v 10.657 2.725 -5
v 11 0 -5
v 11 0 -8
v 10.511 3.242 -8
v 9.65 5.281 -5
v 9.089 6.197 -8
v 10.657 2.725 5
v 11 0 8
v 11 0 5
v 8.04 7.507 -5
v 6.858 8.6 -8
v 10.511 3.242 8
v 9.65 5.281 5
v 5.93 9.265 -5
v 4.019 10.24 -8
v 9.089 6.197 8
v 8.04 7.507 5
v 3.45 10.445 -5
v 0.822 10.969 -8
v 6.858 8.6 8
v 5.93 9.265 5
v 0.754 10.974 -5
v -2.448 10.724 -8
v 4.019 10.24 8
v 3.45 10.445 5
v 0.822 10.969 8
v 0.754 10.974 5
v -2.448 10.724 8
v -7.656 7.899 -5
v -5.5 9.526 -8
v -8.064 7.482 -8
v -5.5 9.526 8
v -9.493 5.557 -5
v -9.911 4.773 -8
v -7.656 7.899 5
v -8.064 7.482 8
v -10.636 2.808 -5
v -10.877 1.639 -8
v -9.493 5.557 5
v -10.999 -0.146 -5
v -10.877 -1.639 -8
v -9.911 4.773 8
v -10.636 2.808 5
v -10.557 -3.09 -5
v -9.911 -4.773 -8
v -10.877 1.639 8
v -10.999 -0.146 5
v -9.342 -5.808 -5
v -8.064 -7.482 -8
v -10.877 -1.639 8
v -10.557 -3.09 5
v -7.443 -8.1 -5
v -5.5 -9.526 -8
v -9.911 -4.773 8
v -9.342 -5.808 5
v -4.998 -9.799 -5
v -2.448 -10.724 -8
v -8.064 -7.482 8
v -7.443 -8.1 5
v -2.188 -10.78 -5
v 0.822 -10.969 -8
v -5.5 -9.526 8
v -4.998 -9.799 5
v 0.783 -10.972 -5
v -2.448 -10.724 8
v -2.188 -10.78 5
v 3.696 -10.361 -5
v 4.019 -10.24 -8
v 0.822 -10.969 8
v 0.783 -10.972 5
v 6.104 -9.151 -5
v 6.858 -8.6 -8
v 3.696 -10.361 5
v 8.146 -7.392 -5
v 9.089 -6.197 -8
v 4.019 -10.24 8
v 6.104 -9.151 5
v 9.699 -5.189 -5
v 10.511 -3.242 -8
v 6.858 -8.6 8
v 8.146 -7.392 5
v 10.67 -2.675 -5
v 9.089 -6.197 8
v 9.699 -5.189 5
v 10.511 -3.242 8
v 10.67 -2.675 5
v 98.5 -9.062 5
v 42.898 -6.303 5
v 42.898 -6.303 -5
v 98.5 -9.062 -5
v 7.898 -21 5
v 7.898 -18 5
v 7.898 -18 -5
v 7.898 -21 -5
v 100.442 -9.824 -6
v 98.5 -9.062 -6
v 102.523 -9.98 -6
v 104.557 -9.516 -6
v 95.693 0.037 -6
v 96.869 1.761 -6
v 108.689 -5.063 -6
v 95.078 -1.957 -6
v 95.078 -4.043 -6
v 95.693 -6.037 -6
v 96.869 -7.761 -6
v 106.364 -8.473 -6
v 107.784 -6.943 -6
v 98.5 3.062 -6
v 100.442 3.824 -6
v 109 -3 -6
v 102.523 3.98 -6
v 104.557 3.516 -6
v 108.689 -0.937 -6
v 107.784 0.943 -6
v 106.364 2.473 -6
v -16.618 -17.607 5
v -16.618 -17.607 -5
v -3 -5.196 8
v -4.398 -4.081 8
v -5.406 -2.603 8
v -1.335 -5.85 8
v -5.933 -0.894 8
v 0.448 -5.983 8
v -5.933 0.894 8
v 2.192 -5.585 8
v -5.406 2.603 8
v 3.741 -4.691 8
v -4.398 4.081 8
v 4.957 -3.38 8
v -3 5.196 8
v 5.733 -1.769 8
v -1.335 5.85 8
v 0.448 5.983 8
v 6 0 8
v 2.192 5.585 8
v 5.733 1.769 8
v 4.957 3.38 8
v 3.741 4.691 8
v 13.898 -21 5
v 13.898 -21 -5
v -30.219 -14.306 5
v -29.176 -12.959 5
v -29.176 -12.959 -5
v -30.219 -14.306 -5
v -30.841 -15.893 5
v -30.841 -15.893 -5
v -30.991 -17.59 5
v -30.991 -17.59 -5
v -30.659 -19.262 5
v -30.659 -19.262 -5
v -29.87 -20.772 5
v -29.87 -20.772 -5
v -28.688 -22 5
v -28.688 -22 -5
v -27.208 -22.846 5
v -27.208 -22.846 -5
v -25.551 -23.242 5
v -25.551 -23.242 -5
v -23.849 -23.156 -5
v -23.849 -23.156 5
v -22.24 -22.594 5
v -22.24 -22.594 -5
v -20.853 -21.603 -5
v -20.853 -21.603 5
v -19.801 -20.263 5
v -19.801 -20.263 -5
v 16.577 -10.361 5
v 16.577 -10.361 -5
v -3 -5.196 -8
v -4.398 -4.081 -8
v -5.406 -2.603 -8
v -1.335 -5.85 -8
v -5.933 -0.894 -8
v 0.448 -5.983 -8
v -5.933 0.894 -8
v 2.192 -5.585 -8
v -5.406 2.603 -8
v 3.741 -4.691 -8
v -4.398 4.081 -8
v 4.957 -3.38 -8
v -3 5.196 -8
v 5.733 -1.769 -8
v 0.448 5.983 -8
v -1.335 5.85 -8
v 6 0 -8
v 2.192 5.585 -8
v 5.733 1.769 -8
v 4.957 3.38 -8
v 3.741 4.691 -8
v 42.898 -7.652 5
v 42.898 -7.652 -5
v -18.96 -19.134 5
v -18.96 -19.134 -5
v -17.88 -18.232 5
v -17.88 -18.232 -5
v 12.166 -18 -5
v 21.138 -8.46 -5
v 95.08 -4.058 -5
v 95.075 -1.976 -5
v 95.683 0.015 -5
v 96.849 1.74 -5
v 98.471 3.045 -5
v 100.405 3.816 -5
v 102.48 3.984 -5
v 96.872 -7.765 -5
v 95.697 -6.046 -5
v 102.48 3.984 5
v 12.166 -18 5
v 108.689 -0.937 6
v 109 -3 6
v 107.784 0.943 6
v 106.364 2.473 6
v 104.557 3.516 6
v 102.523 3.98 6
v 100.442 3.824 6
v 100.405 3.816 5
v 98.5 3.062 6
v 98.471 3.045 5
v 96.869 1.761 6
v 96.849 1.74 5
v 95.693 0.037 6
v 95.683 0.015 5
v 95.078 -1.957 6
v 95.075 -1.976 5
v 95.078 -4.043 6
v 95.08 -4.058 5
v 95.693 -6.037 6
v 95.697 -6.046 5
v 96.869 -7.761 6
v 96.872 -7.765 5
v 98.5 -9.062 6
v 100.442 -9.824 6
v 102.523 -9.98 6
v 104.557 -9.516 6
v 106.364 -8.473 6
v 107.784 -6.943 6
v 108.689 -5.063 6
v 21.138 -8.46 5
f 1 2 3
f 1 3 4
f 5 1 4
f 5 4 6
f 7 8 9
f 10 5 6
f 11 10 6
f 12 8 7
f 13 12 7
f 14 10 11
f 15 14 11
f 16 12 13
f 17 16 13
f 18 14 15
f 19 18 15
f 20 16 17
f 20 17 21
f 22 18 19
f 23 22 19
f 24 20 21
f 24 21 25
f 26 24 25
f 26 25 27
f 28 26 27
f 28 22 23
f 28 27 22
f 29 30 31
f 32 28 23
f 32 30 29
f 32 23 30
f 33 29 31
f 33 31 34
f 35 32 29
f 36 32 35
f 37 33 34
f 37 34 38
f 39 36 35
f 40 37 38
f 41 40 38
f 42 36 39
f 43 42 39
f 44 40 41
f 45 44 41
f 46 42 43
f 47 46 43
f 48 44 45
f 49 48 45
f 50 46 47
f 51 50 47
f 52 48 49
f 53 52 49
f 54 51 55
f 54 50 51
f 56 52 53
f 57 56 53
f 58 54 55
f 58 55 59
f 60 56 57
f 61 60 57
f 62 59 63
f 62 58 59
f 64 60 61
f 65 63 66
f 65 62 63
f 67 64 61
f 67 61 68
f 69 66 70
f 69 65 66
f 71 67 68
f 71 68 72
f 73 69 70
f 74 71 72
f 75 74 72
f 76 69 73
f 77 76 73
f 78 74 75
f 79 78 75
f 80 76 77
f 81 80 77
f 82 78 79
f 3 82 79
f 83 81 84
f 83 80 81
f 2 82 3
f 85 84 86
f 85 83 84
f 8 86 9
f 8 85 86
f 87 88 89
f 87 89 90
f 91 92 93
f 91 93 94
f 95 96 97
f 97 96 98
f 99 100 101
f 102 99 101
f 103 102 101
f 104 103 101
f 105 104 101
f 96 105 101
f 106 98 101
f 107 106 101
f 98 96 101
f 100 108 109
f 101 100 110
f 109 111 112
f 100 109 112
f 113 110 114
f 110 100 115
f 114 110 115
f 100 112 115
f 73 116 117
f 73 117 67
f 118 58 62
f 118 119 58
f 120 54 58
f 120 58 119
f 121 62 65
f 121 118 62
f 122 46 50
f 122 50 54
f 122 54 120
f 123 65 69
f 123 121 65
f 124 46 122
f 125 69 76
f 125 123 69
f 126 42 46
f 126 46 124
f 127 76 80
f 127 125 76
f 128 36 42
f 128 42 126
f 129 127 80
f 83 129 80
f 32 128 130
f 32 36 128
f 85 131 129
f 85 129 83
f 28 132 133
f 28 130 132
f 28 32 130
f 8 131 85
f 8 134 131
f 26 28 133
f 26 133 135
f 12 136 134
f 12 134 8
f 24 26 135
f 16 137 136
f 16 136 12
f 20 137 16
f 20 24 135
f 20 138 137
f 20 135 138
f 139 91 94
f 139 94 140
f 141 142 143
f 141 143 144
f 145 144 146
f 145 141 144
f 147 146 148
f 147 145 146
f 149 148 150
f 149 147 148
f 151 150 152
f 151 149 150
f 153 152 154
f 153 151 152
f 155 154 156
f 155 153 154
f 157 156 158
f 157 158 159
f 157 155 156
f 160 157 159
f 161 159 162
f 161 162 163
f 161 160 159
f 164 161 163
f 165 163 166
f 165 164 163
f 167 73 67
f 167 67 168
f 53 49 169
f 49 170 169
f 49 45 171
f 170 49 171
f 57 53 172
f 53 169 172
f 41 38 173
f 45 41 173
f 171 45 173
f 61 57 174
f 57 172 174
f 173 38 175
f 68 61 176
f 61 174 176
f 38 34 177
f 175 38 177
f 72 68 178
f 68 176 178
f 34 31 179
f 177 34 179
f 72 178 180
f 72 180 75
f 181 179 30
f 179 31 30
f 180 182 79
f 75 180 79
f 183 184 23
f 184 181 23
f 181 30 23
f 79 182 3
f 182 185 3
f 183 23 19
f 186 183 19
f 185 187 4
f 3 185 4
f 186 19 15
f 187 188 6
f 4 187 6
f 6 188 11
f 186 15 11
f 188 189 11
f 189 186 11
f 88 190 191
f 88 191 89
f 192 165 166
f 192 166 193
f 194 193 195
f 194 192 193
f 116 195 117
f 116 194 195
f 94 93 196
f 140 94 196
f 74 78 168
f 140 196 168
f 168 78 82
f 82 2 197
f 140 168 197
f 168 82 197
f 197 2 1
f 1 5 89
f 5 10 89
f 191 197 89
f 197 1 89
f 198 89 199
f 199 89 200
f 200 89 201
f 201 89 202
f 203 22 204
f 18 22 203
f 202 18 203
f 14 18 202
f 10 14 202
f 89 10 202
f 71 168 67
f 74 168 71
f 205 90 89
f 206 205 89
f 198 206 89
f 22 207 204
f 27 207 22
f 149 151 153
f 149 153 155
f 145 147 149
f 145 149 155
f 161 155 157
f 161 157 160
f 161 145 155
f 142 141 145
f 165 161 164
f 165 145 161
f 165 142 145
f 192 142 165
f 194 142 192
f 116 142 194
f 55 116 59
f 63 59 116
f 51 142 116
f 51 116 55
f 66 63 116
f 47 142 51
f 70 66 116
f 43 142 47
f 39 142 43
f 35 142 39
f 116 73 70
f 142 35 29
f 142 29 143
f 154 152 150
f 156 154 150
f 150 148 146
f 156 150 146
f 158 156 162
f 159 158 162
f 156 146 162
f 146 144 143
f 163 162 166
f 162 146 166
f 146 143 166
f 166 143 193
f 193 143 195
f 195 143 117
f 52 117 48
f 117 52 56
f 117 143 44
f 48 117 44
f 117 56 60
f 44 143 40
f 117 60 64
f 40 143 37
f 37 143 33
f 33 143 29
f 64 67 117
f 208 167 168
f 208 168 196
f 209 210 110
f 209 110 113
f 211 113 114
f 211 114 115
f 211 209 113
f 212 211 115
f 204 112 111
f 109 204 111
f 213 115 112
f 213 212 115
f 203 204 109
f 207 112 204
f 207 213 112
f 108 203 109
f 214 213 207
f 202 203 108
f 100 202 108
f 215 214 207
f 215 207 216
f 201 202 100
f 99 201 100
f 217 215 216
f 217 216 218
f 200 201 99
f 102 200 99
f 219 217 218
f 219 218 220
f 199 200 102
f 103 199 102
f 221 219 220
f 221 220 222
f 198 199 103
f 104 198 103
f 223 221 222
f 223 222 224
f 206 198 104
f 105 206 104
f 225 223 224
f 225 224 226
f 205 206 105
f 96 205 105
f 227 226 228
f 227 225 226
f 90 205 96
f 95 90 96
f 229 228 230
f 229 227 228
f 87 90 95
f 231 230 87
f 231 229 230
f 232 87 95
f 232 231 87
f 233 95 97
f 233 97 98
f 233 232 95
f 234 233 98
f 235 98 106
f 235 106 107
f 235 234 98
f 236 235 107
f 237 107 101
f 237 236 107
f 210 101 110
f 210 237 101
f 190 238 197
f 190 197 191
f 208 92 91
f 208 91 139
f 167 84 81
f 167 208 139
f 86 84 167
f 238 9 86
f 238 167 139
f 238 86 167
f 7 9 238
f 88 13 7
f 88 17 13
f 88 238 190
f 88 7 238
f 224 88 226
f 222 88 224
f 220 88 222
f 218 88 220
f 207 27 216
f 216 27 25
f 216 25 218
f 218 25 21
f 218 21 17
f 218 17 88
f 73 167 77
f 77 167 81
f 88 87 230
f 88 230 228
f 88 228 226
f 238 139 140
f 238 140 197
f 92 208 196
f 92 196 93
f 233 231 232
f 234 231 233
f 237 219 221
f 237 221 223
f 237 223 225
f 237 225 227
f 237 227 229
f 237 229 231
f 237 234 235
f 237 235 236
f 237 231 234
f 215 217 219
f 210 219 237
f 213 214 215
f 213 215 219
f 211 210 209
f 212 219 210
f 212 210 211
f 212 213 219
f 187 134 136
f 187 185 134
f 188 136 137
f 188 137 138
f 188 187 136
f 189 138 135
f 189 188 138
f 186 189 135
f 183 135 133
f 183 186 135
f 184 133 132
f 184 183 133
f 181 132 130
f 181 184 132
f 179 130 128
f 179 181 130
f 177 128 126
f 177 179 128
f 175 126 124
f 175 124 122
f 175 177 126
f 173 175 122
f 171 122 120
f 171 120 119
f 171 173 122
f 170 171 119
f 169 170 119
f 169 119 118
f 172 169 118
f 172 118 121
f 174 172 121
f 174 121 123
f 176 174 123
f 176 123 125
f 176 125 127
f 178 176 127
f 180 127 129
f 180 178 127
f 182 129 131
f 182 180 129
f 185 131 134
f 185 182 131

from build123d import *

# Parameters (mm, degrees)
SKETCH1_R               = 11
SKETCH1_R_2             = 6
BOSS_EXTRUDE1_DEPTH     = 8
BOSS_EXTRUDE2_DEPTH     = 6
BOSS_EXTRUDE3_DEPTH     = 5
CUT_EXTRUDE1_DEPTH      = 112.742355901
CUT_EXTRUDE1_DEPTH_BACK = 112.742355901
SKETCH3_R               = 6


with BuildPart() as part:
    # Sketch1 → Boss-Extrude1 (new, symmetric)
    with BuildSketch(Plane.XY):
        Circle(SKETCH1_R)
        Circle(SKETCH1_R_2, mode=Mode.SUBTRACT)
    extrude(amount=BOSS_EXTRUDE1_DEPTH, both=True)



with BuildPart() as body_2:
    # Sketch2 → Boss-Extrude2 (new, symmetric)
    with BuildSketch(Plane.XY):
        with BuildLine():
            ThreePointArc((109, -3), (107.116607967, 1.777062163), (102.479907739, 3.983529807))
            ThreePointArc((102.479907739, 3.983529807), (95.304638828, -0.957418601), (98.5, -9.062177826))
            ThreePointArc((98.5, -9.062177826), (105.5, -9.062177826), (109, -3))
        make_face()
    extrude(amount=BOSS_EXTRUDE2_DEPTH, both=True)


with BuildPart() as part_1:
    add(part.part)

    add(body_2.part)  # Boss-Extrude3 merges body 2
    # Sketch2<3> → Boss-Extrude3 (add, symmetric)
    with BuildSketch(Plane.XY):
        with BuildLine():
            ThreePointArc((0.754140733, 10.974118268), (-3.77780396, 10.330933997), (-7.655588843, 7.898858112))
            Line((-7.655588843, 7.898858112), (-29.175775732, -12.958549415))
            ThreePointArc((-29.175775732, -12.958549415), (-28.687665444, -22), (-19.801298619, -20.262598212))
            ThreePointArc((-19.801298619, -20.262598212), (-18.446505094, -18.651187263), (-16.618471977, -17.606962351))
            Line((-16.618471977, -17.606962351), (3.695770356, -10.360563762))
            Line((3.695770356, -10.360563762), (16.576592604, -10.360563762))
            Line((16.576592604, -10.360563762), (12.165962036, -18))
            Line((12.165962036, -18), (7.898012843, -18))
            Line((7.898012843, -18), (7.898012843, -21))
            Line((7.898012843, -21), (13.898012843, -21))
            Line((13.898012843, -21), (21.138158023, -8.459700694))
            Line((21.138158023, -8.459700694), (42.898012843, -7.651891962))
            Line((42.898012843, -7.651891962), (42.898012843, -6.302949113))
            Line((42.898012843, -6.302949113), (98.5, -9.062177826))
            ThreePointArc((98.5, -9.062177826), (95.304638828, -0.957418601), (102.479907739, 3.983529807))
            Line((102.479907739, 3.983529807), (0.754140733, 10.974118268))
        make_face()
    extrude(amount=BOSS_EXTRUDE3_DEPTH, both=True)

    # Sketch3 → Cut-Extrude1 (cut, two sides: drawn at the far end of the back side and taken through both)
    with BuildSketch(Plane.XY.offset(-CUT_EXTRUDE1_DEPTH_BACK)):
        Circle(SKETCH3_R)
    extrude(amount=CUT_EXTRUDE1_DEPTH + CUT_EXTRUDE1_DEPTH_BACK, mode=Mode.SUBTRACT)


solid = part_1.part
